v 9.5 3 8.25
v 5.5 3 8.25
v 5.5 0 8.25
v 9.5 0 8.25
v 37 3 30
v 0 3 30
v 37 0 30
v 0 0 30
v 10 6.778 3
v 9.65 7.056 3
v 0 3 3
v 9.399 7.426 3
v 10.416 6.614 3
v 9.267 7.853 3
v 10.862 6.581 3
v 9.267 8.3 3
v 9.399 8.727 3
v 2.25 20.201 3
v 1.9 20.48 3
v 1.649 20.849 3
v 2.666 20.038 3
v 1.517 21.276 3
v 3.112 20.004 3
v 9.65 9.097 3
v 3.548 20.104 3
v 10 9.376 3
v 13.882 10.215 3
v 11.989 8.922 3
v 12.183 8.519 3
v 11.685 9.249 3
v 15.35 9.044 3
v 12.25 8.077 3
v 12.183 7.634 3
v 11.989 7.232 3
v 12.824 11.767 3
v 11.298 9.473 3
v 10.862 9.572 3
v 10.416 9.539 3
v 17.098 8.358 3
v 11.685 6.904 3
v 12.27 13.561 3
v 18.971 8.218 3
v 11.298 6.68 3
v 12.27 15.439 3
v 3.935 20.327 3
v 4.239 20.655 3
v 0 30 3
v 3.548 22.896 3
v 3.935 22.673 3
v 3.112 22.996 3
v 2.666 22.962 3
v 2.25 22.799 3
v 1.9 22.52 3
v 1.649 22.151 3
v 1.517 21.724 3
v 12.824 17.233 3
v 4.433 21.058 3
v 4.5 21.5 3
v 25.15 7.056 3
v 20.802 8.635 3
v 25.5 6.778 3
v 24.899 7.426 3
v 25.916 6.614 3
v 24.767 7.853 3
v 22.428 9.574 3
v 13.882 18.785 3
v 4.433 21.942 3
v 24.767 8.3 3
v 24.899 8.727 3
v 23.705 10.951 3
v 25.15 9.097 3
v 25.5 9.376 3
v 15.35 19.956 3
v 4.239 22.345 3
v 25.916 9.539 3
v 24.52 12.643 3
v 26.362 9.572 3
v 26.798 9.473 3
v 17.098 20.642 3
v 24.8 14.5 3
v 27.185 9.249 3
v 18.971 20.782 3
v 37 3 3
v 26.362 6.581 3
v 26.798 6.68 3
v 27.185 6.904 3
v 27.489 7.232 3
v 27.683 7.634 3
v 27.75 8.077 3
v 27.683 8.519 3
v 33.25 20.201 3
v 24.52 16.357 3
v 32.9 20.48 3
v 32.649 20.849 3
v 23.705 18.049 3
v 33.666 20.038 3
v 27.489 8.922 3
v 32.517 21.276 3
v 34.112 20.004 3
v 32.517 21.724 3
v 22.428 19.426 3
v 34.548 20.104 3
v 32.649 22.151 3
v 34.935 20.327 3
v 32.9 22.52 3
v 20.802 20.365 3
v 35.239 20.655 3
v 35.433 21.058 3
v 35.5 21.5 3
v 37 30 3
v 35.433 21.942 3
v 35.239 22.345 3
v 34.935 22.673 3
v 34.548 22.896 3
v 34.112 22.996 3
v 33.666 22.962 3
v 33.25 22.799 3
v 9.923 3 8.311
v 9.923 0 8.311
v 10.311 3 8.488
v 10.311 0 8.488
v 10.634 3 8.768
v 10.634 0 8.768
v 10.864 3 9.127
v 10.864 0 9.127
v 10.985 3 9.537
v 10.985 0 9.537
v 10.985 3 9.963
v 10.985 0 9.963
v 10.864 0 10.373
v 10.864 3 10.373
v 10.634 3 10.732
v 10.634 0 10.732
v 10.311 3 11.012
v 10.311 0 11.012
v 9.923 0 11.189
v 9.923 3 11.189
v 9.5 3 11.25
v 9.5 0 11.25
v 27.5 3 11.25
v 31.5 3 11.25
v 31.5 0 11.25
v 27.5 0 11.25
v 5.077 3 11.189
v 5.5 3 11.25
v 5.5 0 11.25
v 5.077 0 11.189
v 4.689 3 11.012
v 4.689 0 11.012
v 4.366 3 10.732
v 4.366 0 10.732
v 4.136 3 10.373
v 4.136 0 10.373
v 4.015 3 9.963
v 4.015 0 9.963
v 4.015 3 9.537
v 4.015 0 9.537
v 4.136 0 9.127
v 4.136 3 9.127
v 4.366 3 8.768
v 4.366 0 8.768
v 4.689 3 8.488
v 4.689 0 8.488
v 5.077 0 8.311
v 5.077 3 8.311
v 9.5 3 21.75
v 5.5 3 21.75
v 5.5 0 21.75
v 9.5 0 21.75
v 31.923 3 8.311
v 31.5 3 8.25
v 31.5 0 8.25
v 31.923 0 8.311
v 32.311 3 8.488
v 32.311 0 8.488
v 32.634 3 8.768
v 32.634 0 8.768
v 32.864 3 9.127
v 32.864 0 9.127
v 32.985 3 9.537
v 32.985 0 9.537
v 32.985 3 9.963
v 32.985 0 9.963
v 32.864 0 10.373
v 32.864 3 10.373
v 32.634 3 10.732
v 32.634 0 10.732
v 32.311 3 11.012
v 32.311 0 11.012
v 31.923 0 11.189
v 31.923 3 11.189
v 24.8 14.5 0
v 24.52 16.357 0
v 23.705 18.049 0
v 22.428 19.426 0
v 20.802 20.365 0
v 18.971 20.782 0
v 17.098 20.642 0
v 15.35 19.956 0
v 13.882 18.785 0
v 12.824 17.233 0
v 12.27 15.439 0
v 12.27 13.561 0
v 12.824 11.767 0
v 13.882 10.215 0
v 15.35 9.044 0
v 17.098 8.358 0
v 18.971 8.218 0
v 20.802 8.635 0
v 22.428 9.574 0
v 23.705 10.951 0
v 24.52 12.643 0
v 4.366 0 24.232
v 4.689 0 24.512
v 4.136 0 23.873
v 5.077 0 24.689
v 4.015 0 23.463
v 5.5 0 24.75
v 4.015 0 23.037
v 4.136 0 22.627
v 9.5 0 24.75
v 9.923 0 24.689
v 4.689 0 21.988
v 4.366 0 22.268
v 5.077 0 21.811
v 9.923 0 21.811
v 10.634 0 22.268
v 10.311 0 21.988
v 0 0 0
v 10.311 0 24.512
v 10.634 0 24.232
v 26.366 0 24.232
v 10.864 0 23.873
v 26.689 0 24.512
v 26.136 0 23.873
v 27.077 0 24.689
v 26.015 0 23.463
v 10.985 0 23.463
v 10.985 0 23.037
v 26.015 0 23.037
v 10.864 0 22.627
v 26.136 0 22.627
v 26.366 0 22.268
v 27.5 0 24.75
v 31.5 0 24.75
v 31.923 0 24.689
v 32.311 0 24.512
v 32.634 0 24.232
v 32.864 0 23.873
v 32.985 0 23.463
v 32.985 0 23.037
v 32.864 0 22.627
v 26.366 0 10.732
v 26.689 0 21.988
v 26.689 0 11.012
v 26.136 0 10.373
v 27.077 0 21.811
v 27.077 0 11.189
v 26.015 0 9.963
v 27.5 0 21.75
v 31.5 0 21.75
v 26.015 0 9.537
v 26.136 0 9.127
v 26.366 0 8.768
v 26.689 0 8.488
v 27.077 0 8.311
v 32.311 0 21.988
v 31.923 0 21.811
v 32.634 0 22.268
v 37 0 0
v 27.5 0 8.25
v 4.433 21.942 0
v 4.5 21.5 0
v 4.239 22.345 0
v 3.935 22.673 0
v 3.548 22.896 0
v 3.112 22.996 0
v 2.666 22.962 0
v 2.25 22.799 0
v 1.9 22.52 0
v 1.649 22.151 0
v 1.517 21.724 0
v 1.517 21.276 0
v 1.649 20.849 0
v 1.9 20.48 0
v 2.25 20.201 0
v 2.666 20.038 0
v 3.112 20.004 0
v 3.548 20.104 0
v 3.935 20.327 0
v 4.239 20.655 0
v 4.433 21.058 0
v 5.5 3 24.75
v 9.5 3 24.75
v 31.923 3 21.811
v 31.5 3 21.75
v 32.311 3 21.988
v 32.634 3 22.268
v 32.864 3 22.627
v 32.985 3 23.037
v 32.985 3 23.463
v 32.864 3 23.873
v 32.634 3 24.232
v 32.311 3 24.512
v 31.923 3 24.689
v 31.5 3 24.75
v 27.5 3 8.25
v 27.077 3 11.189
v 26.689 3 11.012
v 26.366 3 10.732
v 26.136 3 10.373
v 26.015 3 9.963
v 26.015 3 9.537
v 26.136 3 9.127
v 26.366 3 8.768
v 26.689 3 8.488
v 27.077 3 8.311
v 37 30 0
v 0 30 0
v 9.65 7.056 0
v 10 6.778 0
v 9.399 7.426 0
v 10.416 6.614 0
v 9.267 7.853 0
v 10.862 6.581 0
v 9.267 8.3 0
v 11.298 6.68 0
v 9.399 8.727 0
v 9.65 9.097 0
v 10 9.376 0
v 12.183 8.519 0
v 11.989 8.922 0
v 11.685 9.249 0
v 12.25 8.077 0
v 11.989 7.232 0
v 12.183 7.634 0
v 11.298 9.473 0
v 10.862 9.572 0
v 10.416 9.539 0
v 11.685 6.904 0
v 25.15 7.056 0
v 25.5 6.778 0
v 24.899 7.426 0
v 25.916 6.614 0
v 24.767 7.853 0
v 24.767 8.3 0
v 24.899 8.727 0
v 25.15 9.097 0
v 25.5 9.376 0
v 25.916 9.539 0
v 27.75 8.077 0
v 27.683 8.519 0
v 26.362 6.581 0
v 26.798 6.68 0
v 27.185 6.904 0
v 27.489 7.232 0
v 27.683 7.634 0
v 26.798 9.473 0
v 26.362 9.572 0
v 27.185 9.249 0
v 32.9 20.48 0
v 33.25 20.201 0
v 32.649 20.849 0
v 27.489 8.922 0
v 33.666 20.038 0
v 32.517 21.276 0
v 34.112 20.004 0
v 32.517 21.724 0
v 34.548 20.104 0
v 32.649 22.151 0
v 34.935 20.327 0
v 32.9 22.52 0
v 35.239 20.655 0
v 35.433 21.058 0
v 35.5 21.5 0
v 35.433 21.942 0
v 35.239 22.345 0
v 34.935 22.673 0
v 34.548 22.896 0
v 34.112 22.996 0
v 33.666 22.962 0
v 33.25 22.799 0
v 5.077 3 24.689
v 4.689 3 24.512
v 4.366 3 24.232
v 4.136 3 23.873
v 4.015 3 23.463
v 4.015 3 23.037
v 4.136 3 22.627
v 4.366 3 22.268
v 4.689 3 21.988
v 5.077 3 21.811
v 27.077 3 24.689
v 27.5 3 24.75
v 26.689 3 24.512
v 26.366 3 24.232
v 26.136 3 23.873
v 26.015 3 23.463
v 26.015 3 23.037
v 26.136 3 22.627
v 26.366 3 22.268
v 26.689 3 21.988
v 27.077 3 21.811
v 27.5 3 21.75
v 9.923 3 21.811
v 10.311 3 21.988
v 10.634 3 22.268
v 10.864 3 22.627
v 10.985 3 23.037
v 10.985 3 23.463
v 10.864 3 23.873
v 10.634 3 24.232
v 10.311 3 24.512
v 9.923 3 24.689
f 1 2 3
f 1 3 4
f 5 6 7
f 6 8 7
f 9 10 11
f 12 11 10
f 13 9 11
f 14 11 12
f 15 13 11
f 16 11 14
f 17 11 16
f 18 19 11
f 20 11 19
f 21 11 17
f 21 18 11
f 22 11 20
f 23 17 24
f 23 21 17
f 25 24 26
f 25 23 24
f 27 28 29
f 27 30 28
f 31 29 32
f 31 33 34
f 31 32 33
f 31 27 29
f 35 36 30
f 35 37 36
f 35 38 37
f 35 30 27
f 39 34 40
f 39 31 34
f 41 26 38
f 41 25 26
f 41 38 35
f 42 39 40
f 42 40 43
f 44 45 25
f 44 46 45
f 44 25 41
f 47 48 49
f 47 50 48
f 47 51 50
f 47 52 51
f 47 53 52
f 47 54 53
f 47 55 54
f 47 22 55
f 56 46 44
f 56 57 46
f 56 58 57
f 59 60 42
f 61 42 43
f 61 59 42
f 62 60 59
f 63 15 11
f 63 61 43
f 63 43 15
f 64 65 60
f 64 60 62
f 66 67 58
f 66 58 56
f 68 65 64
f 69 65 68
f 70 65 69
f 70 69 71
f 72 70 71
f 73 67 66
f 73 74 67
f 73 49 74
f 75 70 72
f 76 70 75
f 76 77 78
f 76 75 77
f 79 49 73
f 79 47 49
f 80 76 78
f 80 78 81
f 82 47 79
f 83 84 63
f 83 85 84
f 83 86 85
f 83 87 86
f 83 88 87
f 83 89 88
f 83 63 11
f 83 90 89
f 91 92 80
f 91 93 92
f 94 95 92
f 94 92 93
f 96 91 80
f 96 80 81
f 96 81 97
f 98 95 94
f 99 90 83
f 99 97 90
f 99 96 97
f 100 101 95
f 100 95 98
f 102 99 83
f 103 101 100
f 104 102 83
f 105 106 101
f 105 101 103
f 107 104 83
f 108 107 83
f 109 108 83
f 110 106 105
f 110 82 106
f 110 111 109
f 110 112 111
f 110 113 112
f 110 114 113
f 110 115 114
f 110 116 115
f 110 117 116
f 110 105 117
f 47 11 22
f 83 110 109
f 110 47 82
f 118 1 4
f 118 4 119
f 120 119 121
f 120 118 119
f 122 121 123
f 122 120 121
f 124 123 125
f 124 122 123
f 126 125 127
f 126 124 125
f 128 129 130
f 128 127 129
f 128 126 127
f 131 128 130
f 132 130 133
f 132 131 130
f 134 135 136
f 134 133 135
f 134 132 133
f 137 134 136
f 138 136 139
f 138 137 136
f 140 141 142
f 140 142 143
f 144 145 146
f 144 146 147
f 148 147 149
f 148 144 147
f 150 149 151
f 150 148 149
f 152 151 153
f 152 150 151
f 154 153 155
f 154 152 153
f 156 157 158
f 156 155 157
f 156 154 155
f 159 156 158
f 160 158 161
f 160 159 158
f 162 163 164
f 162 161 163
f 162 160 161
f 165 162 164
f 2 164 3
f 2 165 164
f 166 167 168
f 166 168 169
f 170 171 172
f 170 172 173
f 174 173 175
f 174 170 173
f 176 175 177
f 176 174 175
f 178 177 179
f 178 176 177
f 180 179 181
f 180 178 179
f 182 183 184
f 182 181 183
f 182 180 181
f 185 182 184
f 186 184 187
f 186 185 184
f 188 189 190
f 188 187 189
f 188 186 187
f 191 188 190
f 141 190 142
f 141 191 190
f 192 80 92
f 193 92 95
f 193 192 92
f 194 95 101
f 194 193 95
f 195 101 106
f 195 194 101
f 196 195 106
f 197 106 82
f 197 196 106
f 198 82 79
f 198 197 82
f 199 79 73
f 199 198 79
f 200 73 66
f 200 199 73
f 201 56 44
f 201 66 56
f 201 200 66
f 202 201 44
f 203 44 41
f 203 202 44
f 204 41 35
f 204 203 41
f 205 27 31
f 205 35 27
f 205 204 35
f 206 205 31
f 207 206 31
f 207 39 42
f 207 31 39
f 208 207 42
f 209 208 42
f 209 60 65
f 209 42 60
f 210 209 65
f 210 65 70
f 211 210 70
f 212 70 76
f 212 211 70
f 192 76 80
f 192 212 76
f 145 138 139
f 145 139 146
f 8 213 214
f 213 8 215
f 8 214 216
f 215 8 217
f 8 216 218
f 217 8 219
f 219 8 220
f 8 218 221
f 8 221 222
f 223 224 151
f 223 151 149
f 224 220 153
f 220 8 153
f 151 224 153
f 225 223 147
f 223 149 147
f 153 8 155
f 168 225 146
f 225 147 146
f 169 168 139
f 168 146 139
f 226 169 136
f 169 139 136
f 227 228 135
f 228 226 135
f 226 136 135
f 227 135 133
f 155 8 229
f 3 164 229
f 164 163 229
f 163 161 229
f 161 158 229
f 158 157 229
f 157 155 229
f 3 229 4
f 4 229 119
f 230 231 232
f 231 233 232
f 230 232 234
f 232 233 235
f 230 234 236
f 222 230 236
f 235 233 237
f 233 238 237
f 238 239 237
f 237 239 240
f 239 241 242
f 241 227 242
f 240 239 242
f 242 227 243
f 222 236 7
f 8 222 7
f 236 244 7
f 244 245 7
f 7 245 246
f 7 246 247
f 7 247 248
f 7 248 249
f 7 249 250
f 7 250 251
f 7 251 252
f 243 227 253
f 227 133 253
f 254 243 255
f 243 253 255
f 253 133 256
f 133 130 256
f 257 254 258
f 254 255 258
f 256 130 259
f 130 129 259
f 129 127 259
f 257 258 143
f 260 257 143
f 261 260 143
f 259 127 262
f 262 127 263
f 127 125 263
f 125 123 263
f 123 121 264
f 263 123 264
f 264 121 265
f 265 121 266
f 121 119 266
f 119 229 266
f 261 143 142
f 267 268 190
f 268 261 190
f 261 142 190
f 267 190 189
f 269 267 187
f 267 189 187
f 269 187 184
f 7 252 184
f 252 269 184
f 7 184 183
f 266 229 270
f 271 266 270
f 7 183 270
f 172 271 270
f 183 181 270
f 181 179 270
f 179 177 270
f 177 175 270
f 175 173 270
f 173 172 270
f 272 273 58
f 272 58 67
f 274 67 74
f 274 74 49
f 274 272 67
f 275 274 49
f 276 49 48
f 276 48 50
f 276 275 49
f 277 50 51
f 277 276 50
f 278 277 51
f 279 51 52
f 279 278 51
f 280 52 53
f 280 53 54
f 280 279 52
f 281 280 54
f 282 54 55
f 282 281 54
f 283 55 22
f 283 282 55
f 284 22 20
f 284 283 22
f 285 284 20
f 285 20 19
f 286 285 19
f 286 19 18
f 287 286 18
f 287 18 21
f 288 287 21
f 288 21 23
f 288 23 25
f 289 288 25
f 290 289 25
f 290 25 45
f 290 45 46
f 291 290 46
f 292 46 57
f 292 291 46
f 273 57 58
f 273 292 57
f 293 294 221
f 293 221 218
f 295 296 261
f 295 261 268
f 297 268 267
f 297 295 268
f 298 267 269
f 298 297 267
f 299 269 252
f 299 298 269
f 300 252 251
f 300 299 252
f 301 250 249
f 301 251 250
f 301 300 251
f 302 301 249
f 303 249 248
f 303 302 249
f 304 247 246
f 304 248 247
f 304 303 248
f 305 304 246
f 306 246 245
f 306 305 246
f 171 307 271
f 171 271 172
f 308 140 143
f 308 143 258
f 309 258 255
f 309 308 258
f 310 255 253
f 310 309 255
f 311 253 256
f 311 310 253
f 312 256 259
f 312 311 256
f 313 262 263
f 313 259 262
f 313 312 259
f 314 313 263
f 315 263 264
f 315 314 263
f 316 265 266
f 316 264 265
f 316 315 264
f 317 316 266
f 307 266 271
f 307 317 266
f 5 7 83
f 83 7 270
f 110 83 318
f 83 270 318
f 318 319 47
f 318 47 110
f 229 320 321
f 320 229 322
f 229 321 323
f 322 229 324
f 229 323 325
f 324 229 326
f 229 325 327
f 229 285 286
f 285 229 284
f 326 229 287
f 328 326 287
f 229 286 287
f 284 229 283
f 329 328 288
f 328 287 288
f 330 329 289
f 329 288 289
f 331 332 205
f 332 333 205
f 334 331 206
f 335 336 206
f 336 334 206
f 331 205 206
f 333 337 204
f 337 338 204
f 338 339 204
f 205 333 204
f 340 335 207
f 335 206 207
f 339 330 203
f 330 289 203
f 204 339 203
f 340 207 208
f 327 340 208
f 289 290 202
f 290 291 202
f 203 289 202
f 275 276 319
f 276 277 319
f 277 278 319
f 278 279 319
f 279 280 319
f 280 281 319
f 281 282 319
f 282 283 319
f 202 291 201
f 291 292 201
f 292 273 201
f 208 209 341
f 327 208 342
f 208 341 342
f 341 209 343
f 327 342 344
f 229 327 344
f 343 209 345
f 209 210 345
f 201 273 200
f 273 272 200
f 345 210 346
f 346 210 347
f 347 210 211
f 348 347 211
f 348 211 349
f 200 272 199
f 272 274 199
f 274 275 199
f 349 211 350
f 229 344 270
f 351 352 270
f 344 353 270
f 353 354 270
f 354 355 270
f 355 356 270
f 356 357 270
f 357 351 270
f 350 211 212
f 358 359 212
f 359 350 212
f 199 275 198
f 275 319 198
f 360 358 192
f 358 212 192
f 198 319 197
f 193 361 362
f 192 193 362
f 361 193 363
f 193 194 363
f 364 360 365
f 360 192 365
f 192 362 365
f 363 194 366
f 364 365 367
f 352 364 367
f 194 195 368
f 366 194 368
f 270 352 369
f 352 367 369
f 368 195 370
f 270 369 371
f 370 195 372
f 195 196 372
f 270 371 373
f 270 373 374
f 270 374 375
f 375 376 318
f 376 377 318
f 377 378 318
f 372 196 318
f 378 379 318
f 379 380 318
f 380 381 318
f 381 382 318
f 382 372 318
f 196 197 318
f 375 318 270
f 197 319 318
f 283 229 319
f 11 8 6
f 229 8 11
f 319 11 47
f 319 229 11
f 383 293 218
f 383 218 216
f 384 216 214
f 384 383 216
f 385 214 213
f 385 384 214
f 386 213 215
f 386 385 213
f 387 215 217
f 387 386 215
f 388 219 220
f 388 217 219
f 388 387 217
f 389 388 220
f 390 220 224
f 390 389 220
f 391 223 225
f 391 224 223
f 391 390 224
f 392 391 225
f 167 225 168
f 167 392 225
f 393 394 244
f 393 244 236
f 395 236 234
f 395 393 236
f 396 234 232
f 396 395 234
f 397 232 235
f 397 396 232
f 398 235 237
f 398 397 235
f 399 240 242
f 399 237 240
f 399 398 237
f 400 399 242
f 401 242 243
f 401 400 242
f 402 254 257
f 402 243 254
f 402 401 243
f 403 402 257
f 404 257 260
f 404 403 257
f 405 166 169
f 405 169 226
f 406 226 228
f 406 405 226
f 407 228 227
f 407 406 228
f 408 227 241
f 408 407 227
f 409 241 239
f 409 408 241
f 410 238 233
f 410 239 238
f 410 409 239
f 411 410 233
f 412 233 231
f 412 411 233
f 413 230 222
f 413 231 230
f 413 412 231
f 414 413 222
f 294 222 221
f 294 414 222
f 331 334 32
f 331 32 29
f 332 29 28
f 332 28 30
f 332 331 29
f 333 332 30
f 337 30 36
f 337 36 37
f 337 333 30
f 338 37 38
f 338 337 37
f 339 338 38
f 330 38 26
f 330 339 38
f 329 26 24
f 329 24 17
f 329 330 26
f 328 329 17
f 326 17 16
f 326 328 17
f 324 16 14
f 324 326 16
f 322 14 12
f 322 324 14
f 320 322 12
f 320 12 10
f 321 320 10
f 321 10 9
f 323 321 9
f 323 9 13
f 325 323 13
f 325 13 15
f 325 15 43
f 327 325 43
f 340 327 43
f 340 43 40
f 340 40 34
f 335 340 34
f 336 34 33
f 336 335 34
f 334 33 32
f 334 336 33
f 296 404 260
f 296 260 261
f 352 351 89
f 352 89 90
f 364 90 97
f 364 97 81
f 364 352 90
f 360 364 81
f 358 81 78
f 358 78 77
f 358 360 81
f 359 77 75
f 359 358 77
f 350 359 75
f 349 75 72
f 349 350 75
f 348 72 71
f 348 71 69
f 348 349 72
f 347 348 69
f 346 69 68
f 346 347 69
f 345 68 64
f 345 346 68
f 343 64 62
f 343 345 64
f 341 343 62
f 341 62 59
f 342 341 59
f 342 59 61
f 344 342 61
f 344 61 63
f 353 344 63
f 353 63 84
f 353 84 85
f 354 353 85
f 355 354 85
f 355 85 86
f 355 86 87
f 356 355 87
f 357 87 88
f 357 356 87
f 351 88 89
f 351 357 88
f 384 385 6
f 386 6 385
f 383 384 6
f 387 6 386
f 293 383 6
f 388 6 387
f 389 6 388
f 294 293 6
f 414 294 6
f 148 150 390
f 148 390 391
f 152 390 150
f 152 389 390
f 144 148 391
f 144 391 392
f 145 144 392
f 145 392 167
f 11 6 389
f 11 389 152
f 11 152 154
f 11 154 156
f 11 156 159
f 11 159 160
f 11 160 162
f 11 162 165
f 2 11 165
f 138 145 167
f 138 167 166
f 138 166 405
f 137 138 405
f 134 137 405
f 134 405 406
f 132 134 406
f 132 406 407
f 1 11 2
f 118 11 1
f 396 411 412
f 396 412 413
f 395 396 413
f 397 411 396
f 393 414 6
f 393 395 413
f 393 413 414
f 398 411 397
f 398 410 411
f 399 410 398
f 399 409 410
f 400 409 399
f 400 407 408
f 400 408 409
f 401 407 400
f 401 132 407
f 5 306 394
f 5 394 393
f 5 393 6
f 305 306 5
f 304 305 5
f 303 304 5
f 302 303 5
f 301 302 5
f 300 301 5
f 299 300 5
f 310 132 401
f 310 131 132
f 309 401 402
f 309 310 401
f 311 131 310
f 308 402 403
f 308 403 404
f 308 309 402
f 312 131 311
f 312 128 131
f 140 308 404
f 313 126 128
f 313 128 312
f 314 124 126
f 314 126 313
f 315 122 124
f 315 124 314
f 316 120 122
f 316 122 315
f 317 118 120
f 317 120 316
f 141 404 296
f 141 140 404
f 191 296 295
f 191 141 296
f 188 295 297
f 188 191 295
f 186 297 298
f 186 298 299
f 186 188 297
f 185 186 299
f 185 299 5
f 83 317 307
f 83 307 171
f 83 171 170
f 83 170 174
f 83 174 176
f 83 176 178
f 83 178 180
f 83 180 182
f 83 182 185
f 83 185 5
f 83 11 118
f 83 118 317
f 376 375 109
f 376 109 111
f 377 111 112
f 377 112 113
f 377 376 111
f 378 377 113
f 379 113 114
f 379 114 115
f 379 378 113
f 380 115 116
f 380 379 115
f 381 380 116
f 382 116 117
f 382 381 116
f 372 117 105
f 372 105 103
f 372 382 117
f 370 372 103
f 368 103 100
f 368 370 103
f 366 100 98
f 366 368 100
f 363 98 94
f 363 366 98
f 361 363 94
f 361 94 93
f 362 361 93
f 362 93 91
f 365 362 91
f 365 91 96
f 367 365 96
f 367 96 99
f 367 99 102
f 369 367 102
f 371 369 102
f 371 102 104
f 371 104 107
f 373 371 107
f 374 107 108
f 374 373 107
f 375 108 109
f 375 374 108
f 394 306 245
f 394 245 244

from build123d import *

# Parameters (mm, degrees)
SKETCH1_W                = 37
SKETCH1_H                = 27
SKETCH1_R                = 1.5
SKETCH1_R_2              = 6.3
BOSS_EXTRUDE2_DEPTH      = 3
BOSS_EXTRUDE4_DEPTH      = 27
BOSS_EXTRUDE4_DEPTH_BACK = 3
SKETCH2_W                = 37
SKETCH2_H                = 3
CUT_EXTRUDE1_DEPTH       = 55.753995288
CROQUIS1_W               = 9.332939374
CROQUIS1_H               = 27
SALIENTE_EXTRUIR1_DEPTH  = 10
CROQUIS2_W               = 9.332939374
CROQUIS2_H               = 27
CORTAR_EXTRUIR1_DEPTH    = 10
CROQUIS3_W               = 10.381853436
CROQUIS3_H               = 27
SALIENTE_EXTRUIR2_DEPTH  = 10
CROQUIS4_W               = 10.381853436
CROQUIS4_H               = 27
CORTAR_EXTRUIR3_DEPTH    = 10
CROQUIS5_W               = 9.124203914
CROQUIS5_H               = 27
SALIENTE_EXTRUIR3_DEPTH  = 10
CROQUIS6_W               = 9.124203914
CROQUIS6_H               = 27
CORTAR_EXTRUIR5_DEPTH    = 10


with BuildPart() as part:
    # Sketch1 → Boss-Extrude2 (new body)
    with BuildSketch(Plane.XY):
        with Locations((18.5, 16.5)):
            Rectangle(SKETCH1_W, SKETCH1_H)
        with Locations((10.75, 8.076606241)):
            Circle(SKETCH1_R, mode=Mode.SUBTRACT)
        with Locations((18.5, 14.5)):
            Circle(SKETCH1_R_2, mode=Mode.SUBTRACT)
        with Locations((26.25, 8.076606241)):
            Circle(SKETCH1_R, mode=Mode.SUBTRACT)
        with Locations((3, 21.5)):
            Circle(SKETCH1_R, mode=Mode.SUBTRACT)
        with Locations((34, 21.5)):
            Circle(SKETCH1_R, mode=Mode.SUBTRACT)
    extrude(amount=BOSS_EXTRUDE2_DEPTH)

    # Sketch2 → Boss-Extrude4 (add, two sides: drawn at the far end of the back side and taken through both)
    with BuildSketch(Plane.XY.offset(3).offset(-BOSS_EXTRUDE4_DEPTH_BACK)):
        with Locations((18.5, 1.5)):
            Rectangle(SKETCH2_W, SKETCH2_H)
    extrude(amount=BOSS_EXTRUDE4_DEPTH + BOSS_EXTRUDE4_DEPTH_BACK)

    # Sketch4 → Cut-Extrude1 (cut, through all)
    with BuildSketch(Plane(origin=(0, 3, 0), x_dir=(1, 0, 0), z_dir=(0, 1, 0))):
        with BuildLine():
            Line((5.5, -8.25), (9.5, -8.25))
            ThreePointArc((9.5, -8.25), (11, -9.75), (9.5, -11.25))
            Line((9.5, -11.25), (5.5, -11.25))
            ThreePointArc((5.5, -11.25), (4, -9.75), (5.5, -8.25))
        make_face()
        with BuildLine():
            Line((27.5, -8.25), (31.5, -8.25))
            ThreePointArc((31.5, -8.25), (33, -9.75), (31.5, -11.25))
            Line((31.5, -11.25), (27.5, -11.25))
            ThreePointArc((27.5, -11.25), (26, -9.75), (27.5, -8.25))
        make_face()
        with BuildLine():
            Line((27.5, -21.75), (31.5, -21.75))
            ThreePointArc((31.5, -21.75), (33, -23.25), (31.5, -24.75))
            Line((31.5, -24.75), (27.5, -24.75))
            ThreePointArc((27.5, -24.75), (26, -23.25), (27.5, -21.75))
        make_face()
        with BuildLine():
            Line((5.5, -21.75), (9.5, -21.75))
            ThreePointArc((9.5, -21.75), (11, -23.25), (9.5, -24.75))
            Line((9.5, -24.75), (5.5, -24.75))
            ThreePointArc((5.5, -24.75), (4, -23.25), (5.5, -21.75))
        make_face()
    extrude(amount=-CUT_EXTRUDE1_DEPTH, mode=Mode.SUBTRACT)

    # Croquis1 → Saliente-Extruir1 (add)
    with BuildSketch(Plane(origin=(0, 3, 0), x_dir=(1, 0, 0), z_dir=(0, 1, 0))):
        with Locations((26.333530313, -16.5)):
            Rectangle(CROQUIS1_W, CROQUIS1_H)
    extrude(amount=SALIENTE_EXTRUIR1_DEPTH)

    # Croquis2 → Cortar-Extruir1 (cut)
    with BuildSketch(Plane(origin=(0, 3, 0), x_dir=(1, 0, 0), z_dir=(0, 1, 0))):
        with Locations((26.333530313, -16.5)):
            Rectangle(CROQUIS2_W, CROQUIS2_H)
    extrude(amount=CORTAR_EXTRUIR1_DEPTH, mode=Mode.SUBTRACT)

    # Croquis3 → Saliente-Extruir2 (add)
    with BuildSketch(Plane(origin=(0, 3, 0), x_dir=(1, 0, 0), z_dir=(0, 1, 0))):
        with Locations((25.809073282, -16.5)):
            Rectangle(CROQUIS3_W, CROQUIS3_H)
    extrude(amount=SALIENTE_EXTRUIR2_DEPTH)

    # Croquis4 → Cortar-Extruir3 (cut)
    with BuildSketch(Plane(origin=(0, 3, 0), x_dir=(1, 0, 0), z_dir=(0, 1, 0))):
        with Locations((25.809073282, -16.5)):
            Rectangle(CROQUIS4_W, CROQUIS4_H)
    extrude(amount=CORTAR_EXTRUIR3_DEPTH, mode=Mode.SUBTRACT)

    # Croquis5 → Saliente-Extruir3 (add)
    with BuildSketch(Plane(origin=(0, 3, 0), x_dir=(1, 0, 0), z_dir=(0, 1, 0))):
        with Locations((26.437898043, -16.5)):
            Rectangle(CROQUIS5_W, CROQUIS5_H)
    extrude(amount=SALIENTE_EXTRUIR3_DEPTH)

    # Croquis6 → Cortar-Extruir5 (cut)
    with BuildSketch(Plane(origin=(0, 3, 0), x_dir=(1, 0, 0), z_dir=(0, 1, 0))):
        with Locations((26.437898043, -16.5)):
            Rectangle(CROQUIS6_W, CROQUIS6_H)
    extrude(amount=CORTAR_EXTRUIR5_DEPTH, mode=Mode.SUBTRACT)


solid = part.part
